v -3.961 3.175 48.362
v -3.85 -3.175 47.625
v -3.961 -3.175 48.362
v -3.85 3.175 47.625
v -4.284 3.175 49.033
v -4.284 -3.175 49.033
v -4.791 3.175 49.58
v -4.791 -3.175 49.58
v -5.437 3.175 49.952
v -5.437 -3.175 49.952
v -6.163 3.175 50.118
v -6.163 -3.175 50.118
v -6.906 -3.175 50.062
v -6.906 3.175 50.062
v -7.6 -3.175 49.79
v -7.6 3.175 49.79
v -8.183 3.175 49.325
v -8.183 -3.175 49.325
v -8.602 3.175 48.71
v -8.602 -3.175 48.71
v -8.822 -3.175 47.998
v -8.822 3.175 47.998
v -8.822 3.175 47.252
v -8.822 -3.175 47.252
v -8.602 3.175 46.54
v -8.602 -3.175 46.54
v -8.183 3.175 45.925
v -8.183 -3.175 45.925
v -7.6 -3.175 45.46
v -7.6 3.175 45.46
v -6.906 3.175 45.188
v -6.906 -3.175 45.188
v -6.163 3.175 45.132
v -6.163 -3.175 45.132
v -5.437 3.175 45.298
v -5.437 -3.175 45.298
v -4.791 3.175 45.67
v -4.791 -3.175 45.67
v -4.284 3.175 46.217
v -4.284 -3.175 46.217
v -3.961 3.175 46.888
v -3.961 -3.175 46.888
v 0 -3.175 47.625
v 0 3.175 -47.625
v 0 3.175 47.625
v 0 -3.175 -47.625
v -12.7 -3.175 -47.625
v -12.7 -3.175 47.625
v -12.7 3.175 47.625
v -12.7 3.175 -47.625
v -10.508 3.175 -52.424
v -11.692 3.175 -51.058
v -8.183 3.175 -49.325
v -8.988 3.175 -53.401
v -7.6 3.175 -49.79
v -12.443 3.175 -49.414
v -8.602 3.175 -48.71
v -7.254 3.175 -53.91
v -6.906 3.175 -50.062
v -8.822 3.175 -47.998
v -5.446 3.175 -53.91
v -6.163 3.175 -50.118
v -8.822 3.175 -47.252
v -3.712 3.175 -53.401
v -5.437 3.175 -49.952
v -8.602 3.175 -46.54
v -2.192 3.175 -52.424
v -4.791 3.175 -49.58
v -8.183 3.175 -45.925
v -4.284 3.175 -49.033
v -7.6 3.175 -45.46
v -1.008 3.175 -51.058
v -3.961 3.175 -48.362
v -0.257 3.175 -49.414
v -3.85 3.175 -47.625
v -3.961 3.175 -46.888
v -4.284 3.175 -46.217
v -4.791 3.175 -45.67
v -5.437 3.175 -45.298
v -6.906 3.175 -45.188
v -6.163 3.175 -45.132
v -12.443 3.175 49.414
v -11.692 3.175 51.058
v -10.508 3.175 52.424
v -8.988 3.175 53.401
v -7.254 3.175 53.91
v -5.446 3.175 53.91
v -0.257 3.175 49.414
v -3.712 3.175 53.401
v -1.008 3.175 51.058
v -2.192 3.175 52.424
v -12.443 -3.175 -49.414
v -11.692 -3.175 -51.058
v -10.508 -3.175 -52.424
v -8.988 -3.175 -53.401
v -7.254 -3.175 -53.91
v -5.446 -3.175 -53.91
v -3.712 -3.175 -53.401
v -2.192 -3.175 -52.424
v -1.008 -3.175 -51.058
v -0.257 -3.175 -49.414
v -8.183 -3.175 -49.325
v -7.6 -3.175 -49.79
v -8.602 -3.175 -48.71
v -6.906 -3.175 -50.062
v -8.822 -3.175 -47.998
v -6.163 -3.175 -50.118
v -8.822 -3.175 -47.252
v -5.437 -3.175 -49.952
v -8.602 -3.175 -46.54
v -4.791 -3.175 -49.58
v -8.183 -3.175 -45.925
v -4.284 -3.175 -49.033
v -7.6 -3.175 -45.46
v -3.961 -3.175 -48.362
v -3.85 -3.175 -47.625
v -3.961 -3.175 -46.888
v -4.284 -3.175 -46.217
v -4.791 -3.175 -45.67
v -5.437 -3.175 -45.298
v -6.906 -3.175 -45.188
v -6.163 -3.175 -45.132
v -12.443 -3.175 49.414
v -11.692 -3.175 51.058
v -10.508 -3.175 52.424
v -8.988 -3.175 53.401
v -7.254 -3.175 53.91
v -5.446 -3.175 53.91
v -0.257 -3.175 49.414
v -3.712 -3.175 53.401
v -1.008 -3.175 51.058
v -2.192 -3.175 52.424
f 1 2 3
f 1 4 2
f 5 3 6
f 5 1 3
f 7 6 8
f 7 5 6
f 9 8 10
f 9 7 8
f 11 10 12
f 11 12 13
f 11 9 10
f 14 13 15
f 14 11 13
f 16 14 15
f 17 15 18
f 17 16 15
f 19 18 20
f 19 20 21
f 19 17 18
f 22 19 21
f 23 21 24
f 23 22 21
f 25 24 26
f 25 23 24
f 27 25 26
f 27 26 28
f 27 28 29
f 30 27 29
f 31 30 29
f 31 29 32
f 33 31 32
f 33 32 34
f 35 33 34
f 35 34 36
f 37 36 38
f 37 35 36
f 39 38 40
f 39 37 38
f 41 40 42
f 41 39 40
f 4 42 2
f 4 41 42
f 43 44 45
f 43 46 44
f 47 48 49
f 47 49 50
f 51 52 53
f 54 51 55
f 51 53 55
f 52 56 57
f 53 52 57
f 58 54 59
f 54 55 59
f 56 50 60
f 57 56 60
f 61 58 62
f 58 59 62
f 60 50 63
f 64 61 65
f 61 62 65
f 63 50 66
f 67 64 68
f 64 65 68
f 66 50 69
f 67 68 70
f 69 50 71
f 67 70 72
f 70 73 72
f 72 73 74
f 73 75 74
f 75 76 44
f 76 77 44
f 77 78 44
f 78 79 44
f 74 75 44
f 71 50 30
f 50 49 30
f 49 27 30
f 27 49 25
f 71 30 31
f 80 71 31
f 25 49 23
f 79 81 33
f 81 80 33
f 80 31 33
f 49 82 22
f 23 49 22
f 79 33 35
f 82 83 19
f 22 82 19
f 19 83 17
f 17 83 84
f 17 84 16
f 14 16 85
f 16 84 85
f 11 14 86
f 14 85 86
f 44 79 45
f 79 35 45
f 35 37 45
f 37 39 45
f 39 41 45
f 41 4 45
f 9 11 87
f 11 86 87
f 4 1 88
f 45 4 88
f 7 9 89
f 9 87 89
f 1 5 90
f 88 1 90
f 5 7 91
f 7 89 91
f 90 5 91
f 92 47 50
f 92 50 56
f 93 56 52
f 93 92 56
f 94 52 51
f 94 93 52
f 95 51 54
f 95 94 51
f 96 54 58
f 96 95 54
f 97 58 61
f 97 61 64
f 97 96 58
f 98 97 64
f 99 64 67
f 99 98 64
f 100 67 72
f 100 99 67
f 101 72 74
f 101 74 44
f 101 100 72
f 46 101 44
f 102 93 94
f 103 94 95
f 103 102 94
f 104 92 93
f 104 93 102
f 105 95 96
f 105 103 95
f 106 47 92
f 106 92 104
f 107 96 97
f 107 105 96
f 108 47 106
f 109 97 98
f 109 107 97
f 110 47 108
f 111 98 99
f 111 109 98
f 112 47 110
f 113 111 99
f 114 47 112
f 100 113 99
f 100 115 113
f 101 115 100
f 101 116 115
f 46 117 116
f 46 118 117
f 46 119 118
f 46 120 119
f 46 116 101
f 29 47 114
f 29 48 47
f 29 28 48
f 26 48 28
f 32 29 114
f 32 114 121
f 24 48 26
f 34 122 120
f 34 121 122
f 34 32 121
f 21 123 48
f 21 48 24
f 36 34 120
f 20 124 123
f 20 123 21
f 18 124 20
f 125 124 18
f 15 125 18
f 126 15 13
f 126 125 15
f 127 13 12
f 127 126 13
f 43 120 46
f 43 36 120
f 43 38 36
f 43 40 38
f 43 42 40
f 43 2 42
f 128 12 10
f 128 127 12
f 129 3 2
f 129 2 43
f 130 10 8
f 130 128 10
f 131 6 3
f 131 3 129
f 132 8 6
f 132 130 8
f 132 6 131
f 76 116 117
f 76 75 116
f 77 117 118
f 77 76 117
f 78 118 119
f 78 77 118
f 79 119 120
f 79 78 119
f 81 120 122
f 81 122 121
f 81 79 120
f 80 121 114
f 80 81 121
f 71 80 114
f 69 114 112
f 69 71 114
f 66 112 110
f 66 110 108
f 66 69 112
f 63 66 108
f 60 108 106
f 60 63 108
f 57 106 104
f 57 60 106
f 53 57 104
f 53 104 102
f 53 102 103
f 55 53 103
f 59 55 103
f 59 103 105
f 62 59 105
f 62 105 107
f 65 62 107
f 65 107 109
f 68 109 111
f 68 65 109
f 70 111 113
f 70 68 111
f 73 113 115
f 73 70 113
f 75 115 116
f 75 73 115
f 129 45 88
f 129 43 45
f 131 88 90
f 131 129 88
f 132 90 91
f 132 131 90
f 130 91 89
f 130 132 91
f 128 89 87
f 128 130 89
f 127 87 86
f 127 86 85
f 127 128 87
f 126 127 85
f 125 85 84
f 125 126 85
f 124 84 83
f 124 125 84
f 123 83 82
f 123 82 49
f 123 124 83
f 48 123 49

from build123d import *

# Parameters (mm, degrees)
F0_R     = 2.5
F1_DEPTH = 3.175


with BuildPart() as f1:
    # F0 (on Front) → F1 (new body, symmetric)
    with BuildSketch(Plane.XZ):
        with BuildLine():
            ThreePointArc((0, 47.625), (-6.35, 53.975), (-12.7, 47.625))
            Line((-12.7, 47.625), (-12.7, 0))
            Line((-12.7, 0), (0, 0))
            Line((0, 0), (0, 47.625))
        make_face()
        with Locations((-6.35, 47.625)):
            Circle(F0_R, mode=Mode.SUBTRACT)
        with BuildLine():
            Line((0, 0), (-12.7, 0))
            Line((-12.7, 0), (-12.7, -47.625))
            ThreePointArc((-12.7, -47.625), (-6.35, -53.975), (0, -47.625))
            Line((0, -47.625), (0, 0))
        make_face()
        with Locations((-6.35, -47.625)):
            Circle(F0_R, mode=Mode.SUBTRACT)
    extrude(amount=F1_DEPTH, both=True)


solid = f1.part
